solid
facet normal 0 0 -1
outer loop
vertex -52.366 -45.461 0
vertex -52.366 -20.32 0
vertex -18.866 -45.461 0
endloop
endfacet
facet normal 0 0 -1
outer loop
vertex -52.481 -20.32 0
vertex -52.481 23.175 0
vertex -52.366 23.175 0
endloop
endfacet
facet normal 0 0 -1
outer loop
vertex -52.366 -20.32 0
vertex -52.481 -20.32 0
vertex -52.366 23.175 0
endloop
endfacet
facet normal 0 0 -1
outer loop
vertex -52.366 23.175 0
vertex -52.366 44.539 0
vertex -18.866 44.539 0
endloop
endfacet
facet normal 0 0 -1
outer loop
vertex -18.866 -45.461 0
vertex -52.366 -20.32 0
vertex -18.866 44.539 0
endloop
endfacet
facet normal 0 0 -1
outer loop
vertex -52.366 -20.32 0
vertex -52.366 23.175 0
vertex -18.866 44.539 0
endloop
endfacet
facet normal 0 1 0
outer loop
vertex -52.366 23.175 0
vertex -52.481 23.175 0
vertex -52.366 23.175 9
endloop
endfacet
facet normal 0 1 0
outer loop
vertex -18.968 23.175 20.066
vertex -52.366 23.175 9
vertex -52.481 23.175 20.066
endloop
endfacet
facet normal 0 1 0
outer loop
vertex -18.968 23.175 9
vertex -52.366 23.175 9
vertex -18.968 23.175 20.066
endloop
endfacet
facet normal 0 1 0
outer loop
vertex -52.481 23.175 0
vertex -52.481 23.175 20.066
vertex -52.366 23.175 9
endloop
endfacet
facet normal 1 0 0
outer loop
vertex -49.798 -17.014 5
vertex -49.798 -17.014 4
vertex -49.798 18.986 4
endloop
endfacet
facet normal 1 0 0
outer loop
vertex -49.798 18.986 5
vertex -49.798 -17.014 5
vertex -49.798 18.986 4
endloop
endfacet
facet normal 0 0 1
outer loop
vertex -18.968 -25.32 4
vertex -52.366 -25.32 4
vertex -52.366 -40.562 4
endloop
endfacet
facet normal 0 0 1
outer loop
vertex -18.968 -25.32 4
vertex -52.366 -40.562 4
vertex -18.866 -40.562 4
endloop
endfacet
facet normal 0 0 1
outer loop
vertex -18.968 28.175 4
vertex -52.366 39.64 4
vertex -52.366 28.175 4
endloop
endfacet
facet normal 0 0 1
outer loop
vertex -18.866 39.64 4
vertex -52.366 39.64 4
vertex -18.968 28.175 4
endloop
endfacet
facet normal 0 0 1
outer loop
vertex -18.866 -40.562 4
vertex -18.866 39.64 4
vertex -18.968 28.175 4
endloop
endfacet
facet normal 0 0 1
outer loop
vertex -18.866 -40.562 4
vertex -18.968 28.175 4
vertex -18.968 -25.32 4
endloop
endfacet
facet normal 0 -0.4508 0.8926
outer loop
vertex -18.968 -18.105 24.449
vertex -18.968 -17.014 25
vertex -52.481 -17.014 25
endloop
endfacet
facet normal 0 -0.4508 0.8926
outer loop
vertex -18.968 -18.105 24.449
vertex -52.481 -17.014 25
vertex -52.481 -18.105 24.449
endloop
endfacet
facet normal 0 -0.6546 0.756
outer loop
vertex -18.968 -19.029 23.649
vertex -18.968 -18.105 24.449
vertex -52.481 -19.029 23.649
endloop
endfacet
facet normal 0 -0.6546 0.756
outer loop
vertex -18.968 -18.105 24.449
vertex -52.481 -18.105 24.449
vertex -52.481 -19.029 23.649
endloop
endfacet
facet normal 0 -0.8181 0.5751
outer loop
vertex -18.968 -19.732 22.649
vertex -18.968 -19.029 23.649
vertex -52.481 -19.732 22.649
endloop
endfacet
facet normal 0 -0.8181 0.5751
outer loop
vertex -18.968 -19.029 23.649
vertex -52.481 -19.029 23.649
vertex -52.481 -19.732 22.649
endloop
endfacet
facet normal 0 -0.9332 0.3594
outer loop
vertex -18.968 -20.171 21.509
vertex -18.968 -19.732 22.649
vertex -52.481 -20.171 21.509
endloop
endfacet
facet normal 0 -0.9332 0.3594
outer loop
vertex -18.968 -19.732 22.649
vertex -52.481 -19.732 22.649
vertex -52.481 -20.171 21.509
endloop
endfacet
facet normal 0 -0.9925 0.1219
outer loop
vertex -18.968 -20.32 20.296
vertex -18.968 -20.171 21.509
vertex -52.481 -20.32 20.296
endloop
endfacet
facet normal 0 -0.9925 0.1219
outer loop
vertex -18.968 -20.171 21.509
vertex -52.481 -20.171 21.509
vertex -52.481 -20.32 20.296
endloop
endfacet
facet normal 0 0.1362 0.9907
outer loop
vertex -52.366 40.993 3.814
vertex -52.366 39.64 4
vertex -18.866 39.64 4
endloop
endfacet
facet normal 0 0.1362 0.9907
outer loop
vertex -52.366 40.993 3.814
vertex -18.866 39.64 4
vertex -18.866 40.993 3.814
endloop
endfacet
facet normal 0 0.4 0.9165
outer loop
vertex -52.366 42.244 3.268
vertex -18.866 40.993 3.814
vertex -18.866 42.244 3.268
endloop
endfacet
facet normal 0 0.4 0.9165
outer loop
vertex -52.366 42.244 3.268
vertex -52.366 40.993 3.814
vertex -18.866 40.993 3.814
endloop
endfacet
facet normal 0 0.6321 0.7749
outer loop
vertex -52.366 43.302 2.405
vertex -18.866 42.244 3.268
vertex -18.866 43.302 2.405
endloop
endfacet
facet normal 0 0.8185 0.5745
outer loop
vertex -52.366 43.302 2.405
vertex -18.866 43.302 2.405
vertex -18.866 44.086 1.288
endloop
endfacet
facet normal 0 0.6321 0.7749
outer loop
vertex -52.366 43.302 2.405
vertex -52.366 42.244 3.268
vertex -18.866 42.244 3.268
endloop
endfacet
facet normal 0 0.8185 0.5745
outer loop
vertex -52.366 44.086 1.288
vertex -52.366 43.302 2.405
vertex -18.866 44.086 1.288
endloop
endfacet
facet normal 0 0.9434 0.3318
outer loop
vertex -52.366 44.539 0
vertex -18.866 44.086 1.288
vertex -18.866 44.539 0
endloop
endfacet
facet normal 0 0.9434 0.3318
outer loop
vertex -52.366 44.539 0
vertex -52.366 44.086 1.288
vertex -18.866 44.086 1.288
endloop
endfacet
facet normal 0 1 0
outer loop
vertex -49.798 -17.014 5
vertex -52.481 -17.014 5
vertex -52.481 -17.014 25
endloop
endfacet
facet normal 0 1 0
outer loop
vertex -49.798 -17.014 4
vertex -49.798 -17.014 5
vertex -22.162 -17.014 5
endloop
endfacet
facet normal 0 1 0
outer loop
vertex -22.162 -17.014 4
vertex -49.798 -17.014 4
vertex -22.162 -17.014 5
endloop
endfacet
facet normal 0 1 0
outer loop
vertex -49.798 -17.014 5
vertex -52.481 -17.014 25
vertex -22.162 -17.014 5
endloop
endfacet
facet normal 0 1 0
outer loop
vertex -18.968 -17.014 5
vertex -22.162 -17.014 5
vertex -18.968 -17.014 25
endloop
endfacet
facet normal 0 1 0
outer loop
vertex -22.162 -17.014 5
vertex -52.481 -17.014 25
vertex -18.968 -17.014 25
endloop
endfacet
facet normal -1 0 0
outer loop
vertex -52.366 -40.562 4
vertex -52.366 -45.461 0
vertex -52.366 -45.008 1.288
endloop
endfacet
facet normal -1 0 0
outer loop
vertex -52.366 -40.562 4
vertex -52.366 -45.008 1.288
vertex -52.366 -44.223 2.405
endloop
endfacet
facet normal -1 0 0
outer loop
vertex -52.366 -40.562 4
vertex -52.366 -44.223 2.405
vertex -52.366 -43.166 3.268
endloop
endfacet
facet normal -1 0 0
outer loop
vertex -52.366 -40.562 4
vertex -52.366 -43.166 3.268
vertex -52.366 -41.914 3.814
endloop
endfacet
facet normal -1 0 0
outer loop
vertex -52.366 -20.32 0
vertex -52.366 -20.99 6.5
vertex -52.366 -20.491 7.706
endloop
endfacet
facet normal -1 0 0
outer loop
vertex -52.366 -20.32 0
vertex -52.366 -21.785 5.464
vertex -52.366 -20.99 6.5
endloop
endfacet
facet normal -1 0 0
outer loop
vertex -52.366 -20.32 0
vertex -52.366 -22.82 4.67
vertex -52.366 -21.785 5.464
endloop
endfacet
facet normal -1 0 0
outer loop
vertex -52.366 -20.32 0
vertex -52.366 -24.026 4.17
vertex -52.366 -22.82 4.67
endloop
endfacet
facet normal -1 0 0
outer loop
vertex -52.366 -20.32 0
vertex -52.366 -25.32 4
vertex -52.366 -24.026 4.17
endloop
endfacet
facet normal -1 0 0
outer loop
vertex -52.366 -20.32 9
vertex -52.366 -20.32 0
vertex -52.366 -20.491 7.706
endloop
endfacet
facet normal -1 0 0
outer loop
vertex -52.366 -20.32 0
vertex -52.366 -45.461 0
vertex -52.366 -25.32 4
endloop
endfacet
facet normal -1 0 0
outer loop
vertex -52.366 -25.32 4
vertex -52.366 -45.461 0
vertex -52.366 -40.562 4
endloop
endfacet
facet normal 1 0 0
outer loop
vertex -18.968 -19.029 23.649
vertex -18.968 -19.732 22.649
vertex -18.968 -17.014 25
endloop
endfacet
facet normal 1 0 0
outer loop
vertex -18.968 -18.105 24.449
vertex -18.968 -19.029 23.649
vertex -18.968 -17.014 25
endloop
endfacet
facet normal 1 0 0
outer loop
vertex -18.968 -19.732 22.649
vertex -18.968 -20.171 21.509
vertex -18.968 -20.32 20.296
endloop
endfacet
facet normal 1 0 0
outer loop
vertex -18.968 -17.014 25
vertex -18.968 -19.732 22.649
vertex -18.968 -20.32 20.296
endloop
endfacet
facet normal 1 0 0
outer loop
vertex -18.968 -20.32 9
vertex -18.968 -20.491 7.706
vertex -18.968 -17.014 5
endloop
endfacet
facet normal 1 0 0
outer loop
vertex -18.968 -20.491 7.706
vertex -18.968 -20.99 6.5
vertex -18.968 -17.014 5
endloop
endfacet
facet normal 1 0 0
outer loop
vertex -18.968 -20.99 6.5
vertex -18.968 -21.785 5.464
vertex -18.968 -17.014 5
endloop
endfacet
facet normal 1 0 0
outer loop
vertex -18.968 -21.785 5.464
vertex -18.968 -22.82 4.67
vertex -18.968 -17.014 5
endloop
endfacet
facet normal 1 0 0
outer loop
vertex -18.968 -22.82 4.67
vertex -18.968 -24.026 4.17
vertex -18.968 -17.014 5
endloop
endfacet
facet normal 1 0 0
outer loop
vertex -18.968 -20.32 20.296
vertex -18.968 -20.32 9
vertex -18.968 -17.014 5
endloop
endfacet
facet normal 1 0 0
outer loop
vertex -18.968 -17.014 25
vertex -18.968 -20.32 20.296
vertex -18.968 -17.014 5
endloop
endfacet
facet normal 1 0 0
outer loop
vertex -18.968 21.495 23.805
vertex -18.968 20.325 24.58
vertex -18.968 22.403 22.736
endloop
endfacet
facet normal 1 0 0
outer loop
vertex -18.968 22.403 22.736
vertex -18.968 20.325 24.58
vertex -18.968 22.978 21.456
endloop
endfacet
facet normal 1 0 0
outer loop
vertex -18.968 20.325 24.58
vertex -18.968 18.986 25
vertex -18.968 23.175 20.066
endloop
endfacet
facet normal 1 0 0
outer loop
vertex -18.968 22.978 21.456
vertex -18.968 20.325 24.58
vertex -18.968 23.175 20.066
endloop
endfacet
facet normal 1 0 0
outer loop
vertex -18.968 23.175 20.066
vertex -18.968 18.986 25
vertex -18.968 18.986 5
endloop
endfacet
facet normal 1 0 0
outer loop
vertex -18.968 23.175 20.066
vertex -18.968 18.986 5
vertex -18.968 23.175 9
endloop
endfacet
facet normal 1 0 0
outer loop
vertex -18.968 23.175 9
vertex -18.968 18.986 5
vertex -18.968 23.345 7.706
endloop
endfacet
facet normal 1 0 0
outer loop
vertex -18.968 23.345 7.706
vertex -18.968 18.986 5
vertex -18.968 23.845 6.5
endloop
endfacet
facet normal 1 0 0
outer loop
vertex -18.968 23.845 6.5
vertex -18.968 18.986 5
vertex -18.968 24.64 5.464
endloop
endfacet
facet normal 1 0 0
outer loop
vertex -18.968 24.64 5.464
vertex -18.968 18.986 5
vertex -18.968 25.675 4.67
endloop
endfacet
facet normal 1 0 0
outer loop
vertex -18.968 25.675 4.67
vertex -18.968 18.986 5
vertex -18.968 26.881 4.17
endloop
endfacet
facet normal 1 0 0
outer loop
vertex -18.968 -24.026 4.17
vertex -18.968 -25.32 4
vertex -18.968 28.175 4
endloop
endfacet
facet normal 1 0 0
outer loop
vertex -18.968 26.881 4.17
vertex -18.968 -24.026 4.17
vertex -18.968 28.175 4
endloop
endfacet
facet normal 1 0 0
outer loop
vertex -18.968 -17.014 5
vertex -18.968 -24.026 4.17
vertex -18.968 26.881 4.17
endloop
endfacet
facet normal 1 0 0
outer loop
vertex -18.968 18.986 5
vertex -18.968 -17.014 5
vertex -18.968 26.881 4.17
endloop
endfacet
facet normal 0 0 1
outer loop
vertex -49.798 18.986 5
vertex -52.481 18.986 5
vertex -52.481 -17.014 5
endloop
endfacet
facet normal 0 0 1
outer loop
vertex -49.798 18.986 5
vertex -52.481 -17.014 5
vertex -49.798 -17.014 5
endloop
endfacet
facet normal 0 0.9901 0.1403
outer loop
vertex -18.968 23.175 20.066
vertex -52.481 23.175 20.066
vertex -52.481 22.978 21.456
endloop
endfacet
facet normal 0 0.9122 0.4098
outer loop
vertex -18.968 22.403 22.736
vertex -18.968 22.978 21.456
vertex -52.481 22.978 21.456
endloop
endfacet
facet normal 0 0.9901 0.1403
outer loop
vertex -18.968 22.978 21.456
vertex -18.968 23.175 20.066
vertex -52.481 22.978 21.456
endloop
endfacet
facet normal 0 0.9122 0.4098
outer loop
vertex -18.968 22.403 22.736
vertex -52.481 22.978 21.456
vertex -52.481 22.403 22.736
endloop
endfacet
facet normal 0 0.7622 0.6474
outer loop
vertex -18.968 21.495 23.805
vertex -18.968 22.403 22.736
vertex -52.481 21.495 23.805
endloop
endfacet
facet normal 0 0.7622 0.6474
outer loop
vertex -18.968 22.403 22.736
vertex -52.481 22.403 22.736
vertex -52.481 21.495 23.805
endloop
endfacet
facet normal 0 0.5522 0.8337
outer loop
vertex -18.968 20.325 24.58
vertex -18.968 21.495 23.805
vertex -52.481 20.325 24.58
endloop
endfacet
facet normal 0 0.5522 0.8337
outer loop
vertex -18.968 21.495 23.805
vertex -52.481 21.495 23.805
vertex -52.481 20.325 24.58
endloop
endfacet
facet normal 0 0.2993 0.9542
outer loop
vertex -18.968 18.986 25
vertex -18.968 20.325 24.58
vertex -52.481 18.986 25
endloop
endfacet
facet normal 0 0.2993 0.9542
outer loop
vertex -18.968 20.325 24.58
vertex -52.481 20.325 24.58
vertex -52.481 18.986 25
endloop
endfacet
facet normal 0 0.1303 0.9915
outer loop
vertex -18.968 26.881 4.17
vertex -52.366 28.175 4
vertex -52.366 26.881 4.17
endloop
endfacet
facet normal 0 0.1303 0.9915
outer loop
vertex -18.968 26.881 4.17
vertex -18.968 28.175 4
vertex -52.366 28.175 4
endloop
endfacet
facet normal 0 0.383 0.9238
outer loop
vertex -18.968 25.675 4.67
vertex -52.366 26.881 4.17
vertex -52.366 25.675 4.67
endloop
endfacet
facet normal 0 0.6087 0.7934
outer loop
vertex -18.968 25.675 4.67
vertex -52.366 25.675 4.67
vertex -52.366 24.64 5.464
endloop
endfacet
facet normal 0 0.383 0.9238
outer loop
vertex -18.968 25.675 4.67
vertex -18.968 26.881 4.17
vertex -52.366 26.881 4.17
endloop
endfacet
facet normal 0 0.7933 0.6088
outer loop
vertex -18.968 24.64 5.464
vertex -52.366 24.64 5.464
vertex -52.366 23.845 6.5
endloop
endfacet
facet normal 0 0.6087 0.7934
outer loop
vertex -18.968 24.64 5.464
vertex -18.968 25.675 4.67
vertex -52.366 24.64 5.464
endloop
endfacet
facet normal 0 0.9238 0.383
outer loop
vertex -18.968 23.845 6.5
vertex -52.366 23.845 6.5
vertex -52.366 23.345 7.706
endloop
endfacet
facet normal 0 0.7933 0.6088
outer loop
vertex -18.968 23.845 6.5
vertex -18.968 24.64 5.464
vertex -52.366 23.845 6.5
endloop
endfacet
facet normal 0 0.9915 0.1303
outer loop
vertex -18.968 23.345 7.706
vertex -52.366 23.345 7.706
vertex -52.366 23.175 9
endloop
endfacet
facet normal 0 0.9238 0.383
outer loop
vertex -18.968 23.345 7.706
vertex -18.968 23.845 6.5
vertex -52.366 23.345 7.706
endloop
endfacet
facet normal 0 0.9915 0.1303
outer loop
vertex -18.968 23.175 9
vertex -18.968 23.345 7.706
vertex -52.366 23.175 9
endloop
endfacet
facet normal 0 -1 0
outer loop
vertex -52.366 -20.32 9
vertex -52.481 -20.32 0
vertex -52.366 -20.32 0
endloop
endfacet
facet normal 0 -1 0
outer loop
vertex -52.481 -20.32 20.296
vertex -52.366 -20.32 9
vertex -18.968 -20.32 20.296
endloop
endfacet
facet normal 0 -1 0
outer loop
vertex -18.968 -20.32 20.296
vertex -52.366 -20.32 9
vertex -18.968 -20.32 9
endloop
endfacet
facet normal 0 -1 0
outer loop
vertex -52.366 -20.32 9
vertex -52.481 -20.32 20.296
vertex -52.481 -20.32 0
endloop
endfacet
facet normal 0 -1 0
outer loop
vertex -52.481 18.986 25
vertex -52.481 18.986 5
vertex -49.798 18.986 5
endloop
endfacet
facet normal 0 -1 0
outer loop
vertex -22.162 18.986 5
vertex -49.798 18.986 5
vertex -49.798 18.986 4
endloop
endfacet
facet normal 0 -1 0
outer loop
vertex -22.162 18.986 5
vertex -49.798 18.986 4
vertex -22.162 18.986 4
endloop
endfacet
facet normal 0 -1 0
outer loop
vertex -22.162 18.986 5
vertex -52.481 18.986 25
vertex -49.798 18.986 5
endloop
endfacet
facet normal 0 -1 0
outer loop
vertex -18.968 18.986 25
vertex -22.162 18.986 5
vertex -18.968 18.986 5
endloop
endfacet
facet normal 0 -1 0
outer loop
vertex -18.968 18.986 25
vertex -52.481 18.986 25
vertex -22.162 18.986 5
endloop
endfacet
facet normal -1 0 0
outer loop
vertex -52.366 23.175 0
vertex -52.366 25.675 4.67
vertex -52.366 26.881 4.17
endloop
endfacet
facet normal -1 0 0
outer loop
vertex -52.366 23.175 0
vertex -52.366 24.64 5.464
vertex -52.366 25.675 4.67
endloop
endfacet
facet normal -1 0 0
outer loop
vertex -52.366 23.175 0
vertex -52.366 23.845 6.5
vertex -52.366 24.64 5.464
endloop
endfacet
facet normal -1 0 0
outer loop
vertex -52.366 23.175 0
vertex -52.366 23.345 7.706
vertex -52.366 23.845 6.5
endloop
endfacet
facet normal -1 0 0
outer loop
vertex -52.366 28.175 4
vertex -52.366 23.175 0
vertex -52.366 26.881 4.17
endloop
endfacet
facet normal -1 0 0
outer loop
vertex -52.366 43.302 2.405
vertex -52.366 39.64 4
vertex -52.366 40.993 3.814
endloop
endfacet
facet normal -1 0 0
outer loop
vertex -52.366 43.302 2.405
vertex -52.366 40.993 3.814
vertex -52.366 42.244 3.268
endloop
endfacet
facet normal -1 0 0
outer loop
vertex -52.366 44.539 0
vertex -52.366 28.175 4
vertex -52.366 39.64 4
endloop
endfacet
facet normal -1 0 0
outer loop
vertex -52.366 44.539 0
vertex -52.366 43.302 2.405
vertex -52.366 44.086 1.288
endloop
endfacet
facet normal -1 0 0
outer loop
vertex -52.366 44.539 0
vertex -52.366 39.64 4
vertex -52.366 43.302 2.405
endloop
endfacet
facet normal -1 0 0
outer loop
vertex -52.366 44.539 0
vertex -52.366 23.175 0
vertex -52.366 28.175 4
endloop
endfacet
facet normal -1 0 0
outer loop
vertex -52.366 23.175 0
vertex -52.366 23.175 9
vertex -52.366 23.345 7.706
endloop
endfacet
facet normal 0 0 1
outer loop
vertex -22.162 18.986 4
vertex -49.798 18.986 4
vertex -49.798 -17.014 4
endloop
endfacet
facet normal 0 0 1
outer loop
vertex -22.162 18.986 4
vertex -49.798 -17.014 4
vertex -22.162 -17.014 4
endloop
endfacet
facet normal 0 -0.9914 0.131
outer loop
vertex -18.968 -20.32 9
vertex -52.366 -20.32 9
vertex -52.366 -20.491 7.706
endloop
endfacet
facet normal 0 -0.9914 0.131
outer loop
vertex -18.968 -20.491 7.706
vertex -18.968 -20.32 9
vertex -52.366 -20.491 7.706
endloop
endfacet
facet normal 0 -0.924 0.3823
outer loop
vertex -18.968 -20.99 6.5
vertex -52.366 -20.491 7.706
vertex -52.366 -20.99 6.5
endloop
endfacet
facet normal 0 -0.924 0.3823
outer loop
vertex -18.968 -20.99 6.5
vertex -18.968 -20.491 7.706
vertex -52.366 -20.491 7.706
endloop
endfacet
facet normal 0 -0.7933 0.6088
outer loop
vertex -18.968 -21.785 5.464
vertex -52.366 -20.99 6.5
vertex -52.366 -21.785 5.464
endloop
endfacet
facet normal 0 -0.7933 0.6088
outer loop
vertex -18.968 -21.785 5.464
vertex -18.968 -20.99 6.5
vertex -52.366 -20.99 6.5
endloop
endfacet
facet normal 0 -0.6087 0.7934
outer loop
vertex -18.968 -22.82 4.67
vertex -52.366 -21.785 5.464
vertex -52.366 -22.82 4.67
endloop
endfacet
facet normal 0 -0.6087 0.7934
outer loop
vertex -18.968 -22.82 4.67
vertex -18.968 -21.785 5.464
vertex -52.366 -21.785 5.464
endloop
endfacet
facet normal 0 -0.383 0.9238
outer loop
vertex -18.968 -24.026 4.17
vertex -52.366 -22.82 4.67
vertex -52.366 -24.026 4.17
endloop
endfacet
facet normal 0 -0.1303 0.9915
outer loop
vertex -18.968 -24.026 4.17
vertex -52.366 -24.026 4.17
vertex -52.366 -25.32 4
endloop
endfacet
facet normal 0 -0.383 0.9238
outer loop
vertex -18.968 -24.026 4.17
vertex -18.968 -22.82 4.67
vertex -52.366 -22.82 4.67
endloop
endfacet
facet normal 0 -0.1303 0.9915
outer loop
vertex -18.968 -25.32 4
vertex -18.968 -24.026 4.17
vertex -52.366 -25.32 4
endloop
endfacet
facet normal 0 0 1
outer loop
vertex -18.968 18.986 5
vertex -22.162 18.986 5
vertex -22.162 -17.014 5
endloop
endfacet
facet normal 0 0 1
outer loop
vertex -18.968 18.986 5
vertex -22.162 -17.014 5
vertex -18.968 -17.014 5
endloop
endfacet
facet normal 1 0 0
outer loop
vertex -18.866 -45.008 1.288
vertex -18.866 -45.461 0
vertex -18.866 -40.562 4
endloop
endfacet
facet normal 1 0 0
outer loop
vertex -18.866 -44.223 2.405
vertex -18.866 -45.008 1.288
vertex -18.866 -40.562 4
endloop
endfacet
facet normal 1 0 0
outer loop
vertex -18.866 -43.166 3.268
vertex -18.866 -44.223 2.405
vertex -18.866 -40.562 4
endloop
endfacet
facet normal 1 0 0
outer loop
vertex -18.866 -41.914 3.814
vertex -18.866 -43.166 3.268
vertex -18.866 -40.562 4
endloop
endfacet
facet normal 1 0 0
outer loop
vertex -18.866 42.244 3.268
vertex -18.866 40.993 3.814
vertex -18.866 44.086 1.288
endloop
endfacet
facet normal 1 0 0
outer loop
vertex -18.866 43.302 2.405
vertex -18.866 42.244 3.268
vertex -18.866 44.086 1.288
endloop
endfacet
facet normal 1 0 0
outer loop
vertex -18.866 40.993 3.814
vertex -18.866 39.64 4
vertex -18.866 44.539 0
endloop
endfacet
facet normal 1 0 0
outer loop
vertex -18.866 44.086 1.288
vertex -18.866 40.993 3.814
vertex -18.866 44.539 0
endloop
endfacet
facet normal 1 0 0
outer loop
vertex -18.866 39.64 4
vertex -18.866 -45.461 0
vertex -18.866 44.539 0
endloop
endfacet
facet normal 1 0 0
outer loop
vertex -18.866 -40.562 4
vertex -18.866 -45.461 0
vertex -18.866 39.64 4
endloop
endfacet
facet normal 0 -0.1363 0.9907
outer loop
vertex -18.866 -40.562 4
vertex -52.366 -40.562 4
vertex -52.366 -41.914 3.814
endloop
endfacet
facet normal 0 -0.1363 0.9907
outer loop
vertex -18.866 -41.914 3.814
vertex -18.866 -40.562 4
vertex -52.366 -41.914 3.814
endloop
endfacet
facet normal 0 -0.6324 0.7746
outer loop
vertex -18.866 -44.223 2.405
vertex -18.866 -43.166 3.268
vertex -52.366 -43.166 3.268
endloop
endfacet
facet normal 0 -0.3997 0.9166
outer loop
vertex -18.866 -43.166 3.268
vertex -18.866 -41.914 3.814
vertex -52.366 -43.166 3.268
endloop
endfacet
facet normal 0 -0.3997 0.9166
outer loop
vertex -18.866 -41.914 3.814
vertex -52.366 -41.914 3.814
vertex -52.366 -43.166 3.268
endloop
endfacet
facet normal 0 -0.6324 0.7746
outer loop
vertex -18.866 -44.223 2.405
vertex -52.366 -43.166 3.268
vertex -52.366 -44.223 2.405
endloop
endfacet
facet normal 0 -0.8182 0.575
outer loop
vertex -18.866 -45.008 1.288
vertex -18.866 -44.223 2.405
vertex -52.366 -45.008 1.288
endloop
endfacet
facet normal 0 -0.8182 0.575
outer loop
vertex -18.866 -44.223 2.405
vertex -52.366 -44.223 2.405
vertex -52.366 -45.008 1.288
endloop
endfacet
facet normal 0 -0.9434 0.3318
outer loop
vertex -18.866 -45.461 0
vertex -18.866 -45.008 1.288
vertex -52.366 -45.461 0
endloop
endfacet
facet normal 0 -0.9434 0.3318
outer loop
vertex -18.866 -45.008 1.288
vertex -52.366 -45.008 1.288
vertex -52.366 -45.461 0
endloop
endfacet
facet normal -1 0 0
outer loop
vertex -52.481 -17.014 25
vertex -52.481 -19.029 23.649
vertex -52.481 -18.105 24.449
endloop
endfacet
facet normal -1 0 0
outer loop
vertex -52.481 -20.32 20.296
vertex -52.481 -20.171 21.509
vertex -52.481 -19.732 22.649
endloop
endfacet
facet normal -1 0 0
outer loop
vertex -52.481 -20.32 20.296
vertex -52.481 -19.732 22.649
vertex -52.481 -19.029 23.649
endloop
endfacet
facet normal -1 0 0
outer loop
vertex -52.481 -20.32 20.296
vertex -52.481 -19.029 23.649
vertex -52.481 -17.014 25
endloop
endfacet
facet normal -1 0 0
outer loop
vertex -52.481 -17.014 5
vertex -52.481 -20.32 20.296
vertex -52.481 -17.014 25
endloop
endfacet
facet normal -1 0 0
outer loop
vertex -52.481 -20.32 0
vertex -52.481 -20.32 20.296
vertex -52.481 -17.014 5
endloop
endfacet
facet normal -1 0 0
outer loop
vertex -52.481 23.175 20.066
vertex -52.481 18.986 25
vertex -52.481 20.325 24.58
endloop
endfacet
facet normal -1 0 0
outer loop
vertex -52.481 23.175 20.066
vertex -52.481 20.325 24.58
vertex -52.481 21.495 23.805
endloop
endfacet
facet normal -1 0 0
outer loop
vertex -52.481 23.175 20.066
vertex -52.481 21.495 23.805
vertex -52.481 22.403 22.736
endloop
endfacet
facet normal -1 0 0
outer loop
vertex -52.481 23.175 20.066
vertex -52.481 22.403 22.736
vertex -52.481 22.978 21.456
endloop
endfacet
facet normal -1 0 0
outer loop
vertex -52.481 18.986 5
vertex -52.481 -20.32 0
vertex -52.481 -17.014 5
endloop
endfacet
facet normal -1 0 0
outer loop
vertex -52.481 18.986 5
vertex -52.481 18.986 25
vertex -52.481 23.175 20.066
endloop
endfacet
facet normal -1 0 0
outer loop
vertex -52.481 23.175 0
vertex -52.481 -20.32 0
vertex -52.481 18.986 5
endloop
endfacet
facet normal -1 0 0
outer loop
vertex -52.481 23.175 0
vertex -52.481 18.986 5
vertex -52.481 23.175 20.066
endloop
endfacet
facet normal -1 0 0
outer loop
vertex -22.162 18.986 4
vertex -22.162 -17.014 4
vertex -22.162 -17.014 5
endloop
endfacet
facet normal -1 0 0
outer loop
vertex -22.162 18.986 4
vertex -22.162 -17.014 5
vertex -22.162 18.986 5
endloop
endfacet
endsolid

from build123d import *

# Parameters (mm, degrees)
F1_W        = 33.513052389
F1_H        = 43.4953216463
F2_DEPTH    = 25
F0_W        = 27.636364032
F0_H        = 36
F3_DEPTH    = 25
F4_W        = 33.513052389
F4_H        = 36
F5_DEPTH    = 20
F6_T1_DEPTH = 58.1822545614
F6_T3_DEPTH = 57.0345340949
F7_W        = 34
F7_H        = 90
F8_DEPTH    = 4
F9_T1_DEPTH = 58.4948974279
F10_R       = 5
F11_DEPTH   = 0.5


# Not quite as in the source:
# - a fillet or chamfer that OpenCascade refuses, or shapes differently, is made with other operations: its cross-section is extruded or revolved along the edge and cut away or added


with BuildPart() as f2:
    # F1 (on Top) → F2 (new body)
    with BuildSketch(Plane.XY):
        with Locations((-35.7246743515, 1.4273980632)):
            Rectangle(F1_W, F1_H)
    extrude(amount=F2_DEPTH)

    # F0 (on Top) → F3 (cut)
    with BuildSketch(Plane.XY):
        with Locations((-35.9798576683, 0.9857490659)):
            Rectangle(F0_W, F0_H)
    extrude(amount=F3_DEPTH, mode=Mode.SUBTRACT)

    # F4 (on face) → F5 (cut)
    with BuildSketch(Plane.XY.offset(25)):
        with Locations((-35.7246743515, 0.9857490659)):
            Rectangle(F4_W, F4_H)
    extrude(amount=-F5_DEPTH, mode=Mode.SUBTRACT)

    # F6: fillet of radius 5 on 2 edges, made by hand

    # F6_s2 → F6_t1 (cut)
    with BuildSketch(Plane.YZ.offset(-64.8158016322)):
        with BuildLine():
            ThreePointArc((23.1750588864, 20.0661595655), (21.9864530472, 23.302403461), (18.9857490659, 25))
            Line((18.9857490659, 25), (23.1750588864, 25))
            Line((23.1750588864, 25), (23.1750588864, 20.0661595655))
        make_face()
    extrude(amount=F6_T1_DEPTH, mode=Mode.SUBTRACT)

    # F6_s4 → F6_t3 (cut)
    with BuildSketch(Plane.YZ.offset(-64.241941399)):
        with BuildLine():
            ThreePointArc((-17.0142509341, 25), (-19.4111025802, 23.170600103), (-20.3202627599, 20.2957036588))
            Line((-20.3202627599, 20.2957036588), (-20.3202627599, 25))
            Line((-20.3202627599, 25), (-17.0142509341, 25))
        make_face()
    extrude(amount=F6_T3_DEPTH, mode=Mode.SUBTRACT)

    # F7 (on Top) → F8 (join)
    with BuildSketch(Plane.XY):
        with Locations((-35.3662480154, -0.4606725276)):
            Rectangle(F7_W, F7_H)
    extrude(amount=F8_DEPTH)

    # F9: fillet of radius 5 on 2 edges, made by hand

    # F9_s2 → F9_t1 (cut)
    with BuildSketch(Plane.YZ.offset(-64.6136967294)):
        with BuildLine():
            ThreePointArc((-40.561693042, 4), (-43.7239707021, 2.8729833462), (-45.4606725275, 0))
            Line((-45.4606725275, 0), (-45.4606725276, 4))
            Line((-45.4606725276, 4), (-40.561693042, 4))
        make_face()
        with BuildLine():
            ThreePointArc((39.6403479869, 4), (42.802625647, 2.8729833462), (44.5393274724, 0))
            Line((44.5393274724, 0), (44.5393274724, 4))
            Line((44.5393274724, 4), (39.6403479869, 4))
        make_face()
    extrude(amount=F9_T1_DEPTH, mode=Mode.SUBTRACT)

    # F10
    f10_edges = [f2.edges().sort_by_distance(p)[0] for p in [
        (-35.667198, -20.320263, 4),
        (-35.667198, 23.175059, 4),
    ]]
    fillet(f10_edges, radius=F10_R)

    # F11 (cut): a face of the model
    f11_faces = [f2.faces().sort_by_distance(p)[0] for p in [
        (-18.3662480154, -0.4606725276, 1.9725049158),
    ]]
    extrude(f11_faces, amount=-F11_DEPTH, mode=Mode.SUBTRACT)


solid = f2.part
